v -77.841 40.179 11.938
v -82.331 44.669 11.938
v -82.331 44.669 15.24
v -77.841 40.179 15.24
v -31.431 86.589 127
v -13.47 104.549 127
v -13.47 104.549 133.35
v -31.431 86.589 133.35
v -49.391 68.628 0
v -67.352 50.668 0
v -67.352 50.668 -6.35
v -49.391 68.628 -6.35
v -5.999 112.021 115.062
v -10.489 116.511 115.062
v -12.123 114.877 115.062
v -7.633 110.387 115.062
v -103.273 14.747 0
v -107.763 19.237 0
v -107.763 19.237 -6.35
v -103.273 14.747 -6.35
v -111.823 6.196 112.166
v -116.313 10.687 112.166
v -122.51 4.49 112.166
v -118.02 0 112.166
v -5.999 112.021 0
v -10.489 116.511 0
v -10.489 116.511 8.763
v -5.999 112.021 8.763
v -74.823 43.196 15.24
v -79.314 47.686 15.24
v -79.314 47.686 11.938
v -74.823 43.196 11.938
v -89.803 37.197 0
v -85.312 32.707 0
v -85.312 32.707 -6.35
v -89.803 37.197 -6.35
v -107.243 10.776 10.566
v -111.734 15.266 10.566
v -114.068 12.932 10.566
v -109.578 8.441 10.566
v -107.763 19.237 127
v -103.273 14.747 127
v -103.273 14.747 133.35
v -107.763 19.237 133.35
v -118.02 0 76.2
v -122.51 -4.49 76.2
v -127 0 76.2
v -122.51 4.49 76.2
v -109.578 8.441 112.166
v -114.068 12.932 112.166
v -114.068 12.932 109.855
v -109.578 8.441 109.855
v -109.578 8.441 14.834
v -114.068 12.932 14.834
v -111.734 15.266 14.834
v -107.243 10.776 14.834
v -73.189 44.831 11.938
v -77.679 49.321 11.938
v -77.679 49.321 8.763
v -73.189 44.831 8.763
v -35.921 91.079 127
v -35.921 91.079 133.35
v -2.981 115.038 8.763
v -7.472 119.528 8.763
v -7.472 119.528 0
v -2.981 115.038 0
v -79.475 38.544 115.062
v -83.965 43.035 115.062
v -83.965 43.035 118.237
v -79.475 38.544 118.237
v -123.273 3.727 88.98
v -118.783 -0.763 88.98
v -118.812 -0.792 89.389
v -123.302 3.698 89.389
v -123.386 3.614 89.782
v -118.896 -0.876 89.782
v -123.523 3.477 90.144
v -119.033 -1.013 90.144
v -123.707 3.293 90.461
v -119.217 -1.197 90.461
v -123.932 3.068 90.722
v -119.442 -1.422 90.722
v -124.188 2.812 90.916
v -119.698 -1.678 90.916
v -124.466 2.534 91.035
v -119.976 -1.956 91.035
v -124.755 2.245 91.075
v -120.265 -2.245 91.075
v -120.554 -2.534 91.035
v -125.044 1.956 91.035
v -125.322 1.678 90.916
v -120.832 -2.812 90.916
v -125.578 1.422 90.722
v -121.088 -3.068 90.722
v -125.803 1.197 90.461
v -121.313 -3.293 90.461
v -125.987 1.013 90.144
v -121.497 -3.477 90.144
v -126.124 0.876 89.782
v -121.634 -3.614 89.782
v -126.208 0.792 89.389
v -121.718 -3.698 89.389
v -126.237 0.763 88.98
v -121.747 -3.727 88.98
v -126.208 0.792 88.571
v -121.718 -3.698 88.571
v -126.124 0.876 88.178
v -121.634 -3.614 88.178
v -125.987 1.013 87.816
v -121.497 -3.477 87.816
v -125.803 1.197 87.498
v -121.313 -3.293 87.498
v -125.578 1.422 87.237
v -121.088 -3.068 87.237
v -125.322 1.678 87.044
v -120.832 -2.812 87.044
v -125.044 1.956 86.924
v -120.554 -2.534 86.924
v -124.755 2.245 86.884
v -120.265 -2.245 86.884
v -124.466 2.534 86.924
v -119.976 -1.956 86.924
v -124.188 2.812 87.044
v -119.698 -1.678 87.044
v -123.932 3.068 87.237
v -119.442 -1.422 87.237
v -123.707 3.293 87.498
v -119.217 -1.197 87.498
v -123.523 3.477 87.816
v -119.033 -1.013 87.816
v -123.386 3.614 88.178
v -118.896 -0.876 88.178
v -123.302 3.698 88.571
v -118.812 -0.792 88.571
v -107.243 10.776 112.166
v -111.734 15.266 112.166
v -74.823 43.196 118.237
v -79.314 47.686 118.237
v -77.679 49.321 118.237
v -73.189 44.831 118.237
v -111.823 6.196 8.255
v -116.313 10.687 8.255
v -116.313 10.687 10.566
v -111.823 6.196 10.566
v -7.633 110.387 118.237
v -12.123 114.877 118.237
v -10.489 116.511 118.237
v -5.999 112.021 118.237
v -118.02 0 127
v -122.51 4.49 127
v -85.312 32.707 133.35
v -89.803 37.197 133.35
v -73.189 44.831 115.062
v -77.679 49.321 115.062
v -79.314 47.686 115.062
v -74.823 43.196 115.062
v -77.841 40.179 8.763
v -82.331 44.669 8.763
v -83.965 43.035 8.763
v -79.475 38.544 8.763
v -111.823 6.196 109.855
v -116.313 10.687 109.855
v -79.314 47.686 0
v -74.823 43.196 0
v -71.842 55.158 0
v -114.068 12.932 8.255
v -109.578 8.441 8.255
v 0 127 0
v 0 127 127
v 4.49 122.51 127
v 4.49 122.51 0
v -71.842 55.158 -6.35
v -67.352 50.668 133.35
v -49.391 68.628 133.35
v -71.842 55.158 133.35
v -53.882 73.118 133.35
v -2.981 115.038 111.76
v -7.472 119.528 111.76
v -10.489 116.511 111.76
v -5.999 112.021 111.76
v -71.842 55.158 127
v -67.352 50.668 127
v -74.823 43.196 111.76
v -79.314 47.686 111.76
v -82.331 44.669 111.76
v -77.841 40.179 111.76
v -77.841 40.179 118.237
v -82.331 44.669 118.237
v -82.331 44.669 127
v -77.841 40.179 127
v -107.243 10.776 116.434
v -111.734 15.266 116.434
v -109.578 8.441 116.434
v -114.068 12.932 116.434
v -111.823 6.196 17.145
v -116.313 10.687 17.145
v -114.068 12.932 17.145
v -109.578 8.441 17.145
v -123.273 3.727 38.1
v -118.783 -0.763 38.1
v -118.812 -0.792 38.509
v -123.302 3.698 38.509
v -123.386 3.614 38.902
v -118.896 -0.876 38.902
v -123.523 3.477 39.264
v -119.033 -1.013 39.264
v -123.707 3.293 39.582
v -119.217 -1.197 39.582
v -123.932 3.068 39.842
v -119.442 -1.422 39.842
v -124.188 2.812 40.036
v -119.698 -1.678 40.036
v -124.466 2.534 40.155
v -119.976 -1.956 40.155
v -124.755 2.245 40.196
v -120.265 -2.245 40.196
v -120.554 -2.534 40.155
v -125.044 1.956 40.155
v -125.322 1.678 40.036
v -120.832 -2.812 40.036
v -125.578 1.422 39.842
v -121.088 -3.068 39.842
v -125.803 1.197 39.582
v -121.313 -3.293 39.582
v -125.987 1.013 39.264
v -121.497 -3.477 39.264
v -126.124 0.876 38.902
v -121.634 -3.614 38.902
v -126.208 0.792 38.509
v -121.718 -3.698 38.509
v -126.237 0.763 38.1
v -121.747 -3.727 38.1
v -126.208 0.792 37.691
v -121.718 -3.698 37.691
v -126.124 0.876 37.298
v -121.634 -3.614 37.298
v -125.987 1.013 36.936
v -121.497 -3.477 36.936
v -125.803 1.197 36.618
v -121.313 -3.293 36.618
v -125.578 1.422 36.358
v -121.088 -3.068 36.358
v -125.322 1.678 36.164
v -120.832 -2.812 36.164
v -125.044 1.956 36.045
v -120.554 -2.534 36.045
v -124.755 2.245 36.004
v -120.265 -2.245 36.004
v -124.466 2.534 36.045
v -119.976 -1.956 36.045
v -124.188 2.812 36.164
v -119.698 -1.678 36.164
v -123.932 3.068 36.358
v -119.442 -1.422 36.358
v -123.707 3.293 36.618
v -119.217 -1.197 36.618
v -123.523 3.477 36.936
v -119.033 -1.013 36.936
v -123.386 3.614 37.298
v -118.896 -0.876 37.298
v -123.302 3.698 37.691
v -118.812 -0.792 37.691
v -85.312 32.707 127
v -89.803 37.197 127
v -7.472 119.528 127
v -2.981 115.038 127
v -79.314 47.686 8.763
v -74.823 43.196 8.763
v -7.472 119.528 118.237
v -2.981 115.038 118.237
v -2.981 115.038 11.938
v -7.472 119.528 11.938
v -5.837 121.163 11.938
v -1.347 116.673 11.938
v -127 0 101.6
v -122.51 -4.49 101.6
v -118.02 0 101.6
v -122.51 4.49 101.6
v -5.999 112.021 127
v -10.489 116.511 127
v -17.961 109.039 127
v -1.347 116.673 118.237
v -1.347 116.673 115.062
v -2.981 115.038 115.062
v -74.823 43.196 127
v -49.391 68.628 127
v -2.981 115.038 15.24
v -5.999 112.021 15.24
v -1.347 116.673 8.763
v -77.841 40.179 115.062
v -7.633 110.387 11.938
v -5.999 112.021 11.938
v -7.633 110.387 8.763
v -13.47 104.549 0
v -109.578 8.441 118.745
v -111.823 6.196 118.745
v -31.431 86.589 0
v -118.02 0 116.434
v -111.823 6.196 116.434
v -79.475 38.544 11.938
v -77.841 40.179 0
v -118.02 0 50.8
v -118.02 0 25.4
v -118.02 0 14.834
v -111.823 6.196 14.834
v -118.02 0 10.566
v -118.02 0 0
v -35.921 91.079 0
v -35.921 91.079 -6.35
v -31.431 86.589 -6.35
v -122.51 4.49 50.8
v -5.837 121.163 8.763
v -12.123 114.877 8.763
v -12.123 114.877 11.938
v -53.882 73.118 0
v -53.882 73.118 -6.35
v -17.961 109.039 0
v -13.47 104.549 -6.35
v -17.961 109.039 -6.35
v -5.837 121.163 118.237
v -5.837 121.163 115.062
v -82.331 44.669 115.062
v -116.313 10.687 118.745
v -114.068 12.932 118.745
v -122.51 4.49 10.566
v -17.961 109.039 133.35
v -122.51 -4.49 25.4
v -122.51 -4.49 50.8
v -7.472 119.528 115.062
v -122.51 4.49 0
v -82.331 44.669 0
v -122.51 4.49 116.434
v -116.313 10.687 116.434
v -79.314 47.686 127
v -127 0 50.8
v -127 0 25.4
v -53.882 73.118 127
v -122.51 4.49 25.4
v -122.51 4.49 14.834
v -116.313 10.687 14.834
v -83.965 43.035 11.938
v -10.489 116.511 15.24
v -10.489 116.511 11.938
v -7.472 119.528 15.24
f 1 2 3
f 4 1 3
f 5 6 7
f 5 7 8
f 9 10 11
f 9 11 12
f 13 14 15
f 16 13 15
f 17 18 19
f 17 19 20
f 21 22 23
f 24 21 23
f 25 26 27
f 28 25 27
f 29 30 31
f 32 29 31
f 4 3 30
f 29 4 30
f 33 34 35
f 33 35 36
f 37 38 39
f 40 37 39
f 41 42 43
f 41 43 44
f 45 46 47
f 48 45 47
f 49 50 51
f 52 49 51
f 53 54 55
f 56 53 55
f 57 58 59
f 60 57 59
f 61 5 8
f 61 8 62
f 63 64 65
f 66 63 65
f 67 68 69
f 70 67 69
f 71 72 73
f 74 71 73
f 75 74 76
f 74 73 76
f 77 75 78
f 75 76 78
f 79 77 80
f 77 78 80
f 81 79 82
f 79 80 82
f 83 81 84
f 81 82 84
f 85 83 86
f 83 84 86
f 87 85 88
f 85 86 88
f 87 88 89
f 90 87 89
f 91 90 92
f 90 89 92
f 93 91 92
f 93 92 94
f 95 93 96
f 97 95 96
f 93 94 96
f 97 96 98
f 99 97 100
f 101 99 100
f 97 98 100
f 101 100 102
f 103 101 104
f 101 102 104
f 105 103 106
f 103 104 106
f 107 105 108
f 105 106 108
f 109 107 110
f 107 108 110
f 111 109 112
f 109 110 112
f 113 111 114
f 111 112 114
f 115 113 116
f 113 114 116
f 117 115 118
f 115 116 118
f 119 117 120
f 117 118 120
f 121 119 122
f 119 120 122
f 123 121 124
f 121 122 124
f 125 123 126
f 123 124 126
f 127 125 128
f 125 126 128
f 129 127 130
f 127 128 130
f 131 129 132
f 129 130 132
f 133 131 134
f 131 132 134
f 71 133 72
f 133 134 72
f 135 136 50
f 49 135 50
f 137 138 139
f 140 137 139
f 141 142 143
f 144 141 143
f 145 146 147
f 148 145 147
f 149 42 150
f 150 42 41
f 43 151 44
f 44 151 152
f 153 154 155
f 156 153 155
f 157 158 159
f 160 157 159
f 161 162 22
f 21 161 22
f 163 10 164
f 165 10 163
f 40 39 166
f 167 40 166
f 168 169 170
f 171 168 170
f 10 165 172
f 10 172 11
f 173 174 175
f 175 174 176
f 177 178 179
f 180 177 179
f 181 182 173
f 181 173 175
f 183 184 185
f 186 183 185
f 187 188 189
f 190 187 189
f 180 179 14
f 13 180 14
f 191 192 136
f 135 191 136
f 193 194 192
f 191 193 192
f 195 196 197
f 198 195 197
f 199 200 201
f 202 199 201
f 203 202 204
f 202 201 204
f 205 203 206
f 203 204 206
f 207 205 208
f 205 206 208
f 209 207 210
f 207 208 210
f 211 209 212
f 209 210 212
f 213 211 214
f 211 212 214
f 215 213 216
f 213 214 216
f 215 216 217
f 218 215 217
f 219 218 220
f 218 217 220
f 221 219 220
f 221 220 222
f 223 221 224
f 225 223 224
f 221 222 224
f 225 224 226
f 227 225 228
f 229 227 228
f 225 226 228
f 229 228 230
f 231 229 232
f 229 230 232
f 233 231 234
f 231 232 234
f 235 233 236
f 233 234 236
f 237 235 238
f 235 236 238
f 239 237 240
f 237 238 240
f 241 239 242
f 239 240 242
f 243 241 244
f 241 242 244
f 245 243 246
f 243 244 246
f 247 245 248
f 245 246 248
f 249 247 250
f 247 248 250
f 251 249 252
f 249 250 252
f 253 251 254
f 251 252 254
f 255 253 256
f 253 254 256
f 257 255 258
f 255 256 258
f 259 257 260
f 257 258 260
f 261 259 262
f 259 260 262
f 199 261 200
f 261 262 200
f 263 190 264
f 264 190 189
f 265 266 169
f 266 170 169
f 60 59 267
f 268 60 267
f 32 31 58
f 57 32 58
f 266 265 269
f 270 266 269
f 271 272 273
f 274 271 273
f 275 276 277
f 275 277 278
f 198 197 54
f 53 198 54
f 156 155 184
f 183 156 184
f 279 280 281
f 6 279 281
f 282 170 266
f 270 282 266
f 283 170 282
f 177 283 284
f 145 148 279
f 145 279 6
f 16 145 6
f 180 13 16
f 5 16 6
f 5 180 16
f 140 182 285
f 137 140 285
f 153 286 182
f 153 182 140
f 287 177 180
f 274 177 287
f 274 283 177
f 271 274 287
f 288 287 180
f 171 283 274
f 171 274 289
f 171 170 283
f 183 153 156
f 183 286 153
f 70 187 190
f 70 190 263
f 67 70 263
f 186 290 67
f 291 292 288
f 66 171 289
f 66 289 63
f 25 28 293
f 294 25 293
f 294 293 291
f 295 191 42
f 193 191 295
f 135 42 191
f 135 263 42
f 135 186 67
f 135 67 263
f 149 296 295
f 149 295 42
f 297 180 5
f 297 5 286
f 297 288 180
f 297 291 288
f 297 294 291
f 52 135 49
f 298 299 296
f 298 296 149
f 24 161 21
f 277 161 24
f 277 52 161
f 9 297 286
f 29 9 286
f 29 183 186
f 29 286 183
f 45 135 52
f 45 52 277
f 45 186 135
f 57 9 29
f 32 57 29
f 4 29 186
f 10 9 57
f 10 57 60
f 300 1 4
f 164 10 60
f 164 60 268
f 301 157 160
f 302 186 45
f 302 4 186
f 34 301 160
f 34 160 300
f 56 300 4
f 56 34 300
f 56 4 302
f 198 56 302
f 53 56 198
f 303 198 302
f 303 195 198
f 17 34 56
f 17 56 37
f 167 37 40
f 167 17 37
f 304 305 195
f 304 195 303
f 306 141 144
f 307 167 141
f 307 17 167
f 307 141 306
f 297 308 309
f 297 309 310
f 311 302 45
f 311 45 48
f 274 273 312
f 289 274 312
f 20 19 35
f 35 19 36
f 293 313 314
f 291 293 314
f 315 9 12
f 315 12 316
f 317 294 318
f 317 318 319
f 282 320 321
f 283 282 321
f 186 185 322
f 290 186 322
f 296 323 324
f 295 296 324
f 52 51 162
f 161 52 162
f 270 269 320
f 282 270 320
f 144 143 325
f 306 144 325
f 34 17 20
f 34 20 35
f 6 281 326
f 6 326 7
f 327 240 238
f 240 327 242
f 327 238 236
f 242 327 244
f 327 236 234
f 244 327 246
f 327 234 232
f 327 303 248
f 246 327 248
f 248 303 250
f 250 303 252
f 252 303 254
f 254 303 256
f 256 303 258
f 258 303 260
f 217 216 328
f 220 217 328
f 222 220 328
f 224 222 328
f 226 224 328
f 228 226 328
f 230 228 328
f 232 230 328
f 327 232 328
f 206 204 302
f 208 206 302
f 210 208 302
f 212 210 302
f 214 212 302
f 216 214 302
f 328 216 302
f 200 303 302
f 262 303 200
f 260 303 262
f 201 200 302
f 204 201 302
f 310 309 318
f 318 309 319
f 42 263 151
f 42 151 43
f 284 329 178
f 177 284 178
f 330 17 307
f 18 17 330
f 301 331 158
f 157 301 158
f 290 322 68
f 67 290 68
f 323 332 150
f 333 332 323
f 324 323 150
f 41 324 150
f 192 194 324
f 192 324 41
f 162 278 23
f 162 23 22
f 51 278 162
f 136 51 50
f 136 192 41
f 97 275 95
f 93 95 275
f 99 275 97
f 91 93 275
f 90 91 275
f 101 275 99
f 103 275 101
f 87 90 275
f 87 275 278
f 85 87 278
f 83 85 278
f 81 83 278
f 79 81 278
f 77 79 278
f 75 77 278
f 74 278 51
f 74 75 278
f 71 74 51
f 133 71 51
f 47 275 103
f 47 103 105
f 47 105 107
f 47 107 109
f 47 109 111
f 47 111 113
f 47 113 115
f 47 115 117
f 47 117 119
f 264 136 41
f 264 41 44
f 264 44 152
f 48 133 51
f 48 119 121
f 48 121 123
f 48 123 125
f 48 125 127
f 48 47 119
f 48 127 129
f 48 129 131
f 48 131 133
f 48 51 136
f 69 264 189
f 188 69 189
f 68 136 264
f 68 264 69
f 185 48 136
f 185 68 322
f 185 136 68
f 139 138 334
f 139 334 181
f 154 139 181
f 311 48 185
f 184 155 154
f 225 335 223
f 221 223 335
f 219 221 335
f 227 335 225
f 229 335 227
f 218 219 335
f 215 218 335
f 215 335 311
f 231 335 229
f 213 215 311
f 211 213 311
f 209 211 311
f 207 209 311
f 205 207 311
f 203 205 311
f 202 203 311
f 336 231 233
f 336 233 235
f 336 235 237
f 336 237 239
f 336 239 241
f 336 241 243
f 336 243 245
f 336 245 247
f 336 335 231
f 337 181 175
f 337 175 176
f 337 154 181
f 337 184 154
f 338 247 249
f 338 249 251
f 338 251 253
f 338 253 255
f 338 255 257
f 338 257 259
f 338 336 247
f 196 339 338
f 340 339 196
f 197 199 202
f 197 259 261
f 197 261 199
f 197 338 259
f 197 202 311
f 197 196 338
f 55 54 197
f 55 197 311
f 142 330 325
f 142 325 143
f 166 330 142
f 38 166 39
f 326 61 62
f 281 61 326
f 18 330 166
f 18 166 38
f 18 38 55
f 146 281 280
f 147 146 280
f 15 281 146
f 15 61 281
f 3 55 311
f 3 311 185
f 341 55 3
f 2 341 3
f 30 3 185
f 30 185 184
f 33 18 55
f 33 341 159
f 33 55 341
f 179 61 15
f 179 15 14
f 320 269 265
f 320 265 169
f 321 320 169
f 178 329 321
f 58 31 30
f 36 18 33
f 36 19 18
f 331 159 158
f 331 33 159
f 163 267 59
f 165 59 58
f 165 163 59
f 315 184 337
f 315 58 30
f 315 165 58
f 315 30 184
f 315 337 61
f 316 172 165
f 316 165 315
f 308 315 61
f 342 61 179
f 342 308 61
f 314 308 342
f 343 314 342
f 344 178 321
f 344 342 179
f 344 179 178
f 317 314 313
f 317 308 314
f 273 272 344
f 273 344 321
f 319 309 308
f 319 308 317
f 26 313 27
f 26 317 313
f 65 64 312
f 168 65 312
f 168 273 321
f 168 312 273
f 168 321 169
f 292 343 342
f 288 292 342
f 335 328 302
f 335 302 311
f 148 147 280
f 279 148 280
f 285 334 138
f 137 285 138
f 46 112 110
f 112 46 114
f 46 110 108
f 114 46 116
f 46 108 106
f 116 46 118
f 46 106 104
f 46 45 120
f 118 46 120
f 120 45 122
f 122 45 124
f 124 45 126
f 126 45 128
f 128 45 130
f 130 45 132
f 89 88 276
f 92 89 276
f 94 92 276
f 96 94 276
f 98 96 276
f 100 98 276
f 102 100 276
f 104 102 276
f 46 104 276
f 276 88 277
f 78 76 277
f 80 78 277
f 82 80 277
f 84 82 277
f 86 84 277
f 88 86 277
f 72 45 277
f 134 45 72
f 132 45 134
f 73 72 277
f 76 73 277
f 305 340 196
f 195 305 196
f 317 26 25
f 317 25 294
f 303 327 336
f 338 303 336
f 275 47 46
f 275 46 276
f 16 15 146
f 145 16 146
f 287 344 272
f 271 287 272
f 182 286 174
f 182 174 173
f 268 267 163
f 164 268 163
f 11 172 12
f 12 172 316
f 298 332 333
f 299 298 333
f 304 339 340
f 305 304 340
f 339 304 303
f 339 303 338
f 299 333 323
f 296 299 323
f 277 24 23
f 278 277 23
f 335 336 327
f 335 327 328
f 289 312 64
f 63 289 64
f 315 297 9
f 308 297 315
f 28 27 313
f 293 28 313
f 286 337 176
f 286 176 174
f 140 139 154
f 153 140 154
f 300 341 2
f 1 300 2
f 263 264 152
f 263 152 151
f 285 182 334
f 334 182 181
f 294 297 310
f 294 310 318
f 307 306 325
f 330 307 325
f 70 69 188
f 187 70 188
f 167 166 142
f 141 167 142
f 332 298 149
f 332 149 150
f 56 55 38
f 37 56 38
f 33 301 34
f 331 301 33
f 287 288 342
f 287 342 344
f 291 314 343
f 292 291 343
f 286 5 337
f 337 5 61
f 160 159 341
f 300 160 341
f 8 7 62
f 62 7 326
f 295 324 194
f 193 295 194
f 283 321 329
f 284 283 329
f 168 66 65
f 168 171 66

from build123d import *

# Parameters (mm, degrees)
BOSS_EXTRUDE1_DEPTH = 127
SKETCH2_W           = 25.4
SKETCH2_H           = 6.35
BOSS_EXTRUDE2_DEPTH = 6.35
LPATTERN1_COUNT     = 2
LPATTERN1_PITCH     = 50.8
SKETCH3_R           = 2.0955
CUT_EXTRUDE1_DEPTH  = 6.35
CUT_EXTRUDE2_DEPTH  = 6.35
BOSS_EXTRUDE4_DEPTH = 6.35
LPATTERN3_COUNT     = 3
LPATTERN3_PITCH     = 50.8
BOSS_EXTRUDE5_DEPTH = 6.35
LPATTERN4_COUNT     = 3
LPATTERN4_PITCH     = 50.8
CUT_EXTRUDE3_DEPTH  = 6.35


with BuildPart() as part:
    # Sketch1 → Boss-Extrude1 (new body)
    with BuildSketch(Plane.XY):
        Polygon((0, 127), (4.490128061, 122.509871939), (-118.019743879, 0), (-122.509871939, 4.490128061), align=None)
    extrude(amount=BOSS_EXTRUDE1_DEPTH)

    # Sketch2 → Boss-Extrude2 (add)
    with BuildSketch(Plane(origin=(-59.009871939, -59.009871939, 0), x_dir=(0, 0, 1), z_dir=(-0.7071067811865474, -0.7071067811865477, 0))):
        with Locations((38.1, 86.627561211)):
            Rectangle(SKETCH2_W, SKETCH2_H)
    boss_extrude2 = extrude(amount=BOSS_EXTRUDE2_DEPTH)

    # LPattern1: Boss-Extrude2 ×2
    with Locations(*[(0, 0, i * LPATTERN1_PITCH) for i in range(1, LPATTERN1_COUNT)]):
        add(boss_extrude2)

    # Sketch3 → Cut-Extrude1 (cut)
    with BuildSketch(Plane(origin=(-59.009871939, 59.009871939, 0), x_dir=(0, 0, -1), z_dir=(0.7071067811865476, -0.7071067811865476, 0))):
        with Locations(Location((-38.1, -86.627561211, 0), (0, 0, 90))):
            Circle(SKETCH3_R)
        with Locations(Location((-88.979711059, -86.627561211, 0), (0, 0, 90))):
            Circle(SKETCH3_R)
    extrude(amount=-CUT_EXTRUDE1_DEPTH, mode=Mode.SUBTRACT)

    # Sketch4 → Cut-Extrude2 (cut)
    with BuildSketch(Plane(origin=(-63.5, 63.5, 0), x_dir=(0, 0, 1), z_dir=(-0.7071067811865476, 0.7071067811865476, 0))):
        Polygon((10.5664, -83.452561211), (14.8336, -83.452561211), (14.8336, -74.689561211), (17.145, -74.689561211), (17.145, -71.514561211), (14.8336, -71.514561211), (14.8336, -68.212561211), (10.5664, -68.212561211), (10.5664, -71.514561211), (8.255, -71.514561211), (8.255, -74.689561211), (10.5664, -74.689561211), align=None)
        Polygon((112.1664, -83.452561211), (116.4336, -83.452561211), (116.4336, -74.689561211), (118.745, -74.689561211), (118.745, -71.514561211), (116.4336, -71.514561211), (116.4336, -68.212561211), (112.1664, -68.212561211), (112.1664, -71.514561211), (109.855, -71.514561211), (109.855, -74.689561211), (112.1664, -74.689561211), align=None)
    extrude(amount=-CUT_EXTRUDE2_DEPTH, mode=Mode.SUBTRACT)

    # Sketch6 → Boss-Extrude4 (add)
    with BuildSketch(Plane(origin=(0, 0, 0), x_dir=(-1, 0, 0), z_dir=(0, 0, -1))):
        Polygon((13.470384182, 104.549359697), (17.960512242, 109.039487758), (35.921024484, 91.078975516), (31.430896424, 86.588847455), align=None)
    boss_extrude4 = extrude(amount=BOSS_EXTRUDE4_DEPTH)

    # LPattern3: Boss-Extrude4 ×3
    with Locations(*[Vector(-0.7071067811865481, -0.7071067811865469, 0) * (i * LPATTERN3_PITCH) for i in range(1, LPATTERN3_COUNT)]):
        add(boss_extrude4)

    # Sketch7 → Boss-Extrude5 (add)
    with BuildSketch(Plane.XY.offset(127)):
        Polygon((-17.960512242, 109.039487758), (-13.470384182, 104.549359697), (-31.430896424, 86.588847455), (-35.921024484, 91.078975516), align=None)
    boss_extrude5 = extrude(amount=BOSS_EXTRUDE5_DEPTH)

    # LPattern4: Boss-Extrude5 ×3
    with Locations(*[Vector(-0.7071067811865475, -0.7071067811865476, 0) * (i * LPATTERN4_PITCH) for i in range(1, LPATTERN4_COUNT)]):
        add(boss_extrude5)

    # Sketch8 → Cut-Extrude3 (cut)
    with BuildSketch(Plane(origin=(-63.5, 63.5, 0), x_dir=(0, 0, 1), z_dir=(-0.7071067811865476, 0.7071067811865476, 0))):
        Polygon((127, -26.631038789), (127, -22.363838789), (118.237, -22.363838789), (118.237, -20.052438789), (115.062, -20.052438789), (115.062, -22.363838789), (111.76, -22.363838789), (111.76, -26.631038789), (115.062, -26.631038789), (115.062, -28.942438789), (118.237, -28.942438789), (118.237, -26.631038789), align=None)
        Polygon((0, 79.236161211), (0, 74.968961211), (8.763, 74.968961211), (8.763, 72.657561211), (11.938, 72.657561211), (11.938, 74.968961211), (15.24, 74.968961211), (15.24, 79.236161211), (11.938, 79.236161211), (11.938, 81.547561211), (8.763, 81.547561211), (8.763, 79.236161211), align=None)
        Polygon((0, -22.363838789), (0, -26.631038789), (8.763, -26.631038789), (8.763, -28.942438789), (11.938, -28.942438789), (11.938, -26.631038789), (15.24, -26.631038789), (15.24, -22.363838789), (11.938, -22.363838789), (11.938, -20.052438789), (8.763, -20.052438789), (8.763, -22.363838789), align=None)
        Polygon((127, 74.968961211), (127, 79.236161211), (118.237, 79.236161211), (118.237, 81.547561211), (115.062, 81.547561211), (115.062, 79.236161211), (111.76, 79.236161211), (111.76, 74.968961211), (115.062, 74.968961211), (115.062, 72.657561211), (118.237, 72.657561211), (118.237, 74.968961211), align=None)
    extrude(amount=-CUT_EXTRUDE3_DEPTH, mode=Mode.SUBTRACT)


solid = part.part
